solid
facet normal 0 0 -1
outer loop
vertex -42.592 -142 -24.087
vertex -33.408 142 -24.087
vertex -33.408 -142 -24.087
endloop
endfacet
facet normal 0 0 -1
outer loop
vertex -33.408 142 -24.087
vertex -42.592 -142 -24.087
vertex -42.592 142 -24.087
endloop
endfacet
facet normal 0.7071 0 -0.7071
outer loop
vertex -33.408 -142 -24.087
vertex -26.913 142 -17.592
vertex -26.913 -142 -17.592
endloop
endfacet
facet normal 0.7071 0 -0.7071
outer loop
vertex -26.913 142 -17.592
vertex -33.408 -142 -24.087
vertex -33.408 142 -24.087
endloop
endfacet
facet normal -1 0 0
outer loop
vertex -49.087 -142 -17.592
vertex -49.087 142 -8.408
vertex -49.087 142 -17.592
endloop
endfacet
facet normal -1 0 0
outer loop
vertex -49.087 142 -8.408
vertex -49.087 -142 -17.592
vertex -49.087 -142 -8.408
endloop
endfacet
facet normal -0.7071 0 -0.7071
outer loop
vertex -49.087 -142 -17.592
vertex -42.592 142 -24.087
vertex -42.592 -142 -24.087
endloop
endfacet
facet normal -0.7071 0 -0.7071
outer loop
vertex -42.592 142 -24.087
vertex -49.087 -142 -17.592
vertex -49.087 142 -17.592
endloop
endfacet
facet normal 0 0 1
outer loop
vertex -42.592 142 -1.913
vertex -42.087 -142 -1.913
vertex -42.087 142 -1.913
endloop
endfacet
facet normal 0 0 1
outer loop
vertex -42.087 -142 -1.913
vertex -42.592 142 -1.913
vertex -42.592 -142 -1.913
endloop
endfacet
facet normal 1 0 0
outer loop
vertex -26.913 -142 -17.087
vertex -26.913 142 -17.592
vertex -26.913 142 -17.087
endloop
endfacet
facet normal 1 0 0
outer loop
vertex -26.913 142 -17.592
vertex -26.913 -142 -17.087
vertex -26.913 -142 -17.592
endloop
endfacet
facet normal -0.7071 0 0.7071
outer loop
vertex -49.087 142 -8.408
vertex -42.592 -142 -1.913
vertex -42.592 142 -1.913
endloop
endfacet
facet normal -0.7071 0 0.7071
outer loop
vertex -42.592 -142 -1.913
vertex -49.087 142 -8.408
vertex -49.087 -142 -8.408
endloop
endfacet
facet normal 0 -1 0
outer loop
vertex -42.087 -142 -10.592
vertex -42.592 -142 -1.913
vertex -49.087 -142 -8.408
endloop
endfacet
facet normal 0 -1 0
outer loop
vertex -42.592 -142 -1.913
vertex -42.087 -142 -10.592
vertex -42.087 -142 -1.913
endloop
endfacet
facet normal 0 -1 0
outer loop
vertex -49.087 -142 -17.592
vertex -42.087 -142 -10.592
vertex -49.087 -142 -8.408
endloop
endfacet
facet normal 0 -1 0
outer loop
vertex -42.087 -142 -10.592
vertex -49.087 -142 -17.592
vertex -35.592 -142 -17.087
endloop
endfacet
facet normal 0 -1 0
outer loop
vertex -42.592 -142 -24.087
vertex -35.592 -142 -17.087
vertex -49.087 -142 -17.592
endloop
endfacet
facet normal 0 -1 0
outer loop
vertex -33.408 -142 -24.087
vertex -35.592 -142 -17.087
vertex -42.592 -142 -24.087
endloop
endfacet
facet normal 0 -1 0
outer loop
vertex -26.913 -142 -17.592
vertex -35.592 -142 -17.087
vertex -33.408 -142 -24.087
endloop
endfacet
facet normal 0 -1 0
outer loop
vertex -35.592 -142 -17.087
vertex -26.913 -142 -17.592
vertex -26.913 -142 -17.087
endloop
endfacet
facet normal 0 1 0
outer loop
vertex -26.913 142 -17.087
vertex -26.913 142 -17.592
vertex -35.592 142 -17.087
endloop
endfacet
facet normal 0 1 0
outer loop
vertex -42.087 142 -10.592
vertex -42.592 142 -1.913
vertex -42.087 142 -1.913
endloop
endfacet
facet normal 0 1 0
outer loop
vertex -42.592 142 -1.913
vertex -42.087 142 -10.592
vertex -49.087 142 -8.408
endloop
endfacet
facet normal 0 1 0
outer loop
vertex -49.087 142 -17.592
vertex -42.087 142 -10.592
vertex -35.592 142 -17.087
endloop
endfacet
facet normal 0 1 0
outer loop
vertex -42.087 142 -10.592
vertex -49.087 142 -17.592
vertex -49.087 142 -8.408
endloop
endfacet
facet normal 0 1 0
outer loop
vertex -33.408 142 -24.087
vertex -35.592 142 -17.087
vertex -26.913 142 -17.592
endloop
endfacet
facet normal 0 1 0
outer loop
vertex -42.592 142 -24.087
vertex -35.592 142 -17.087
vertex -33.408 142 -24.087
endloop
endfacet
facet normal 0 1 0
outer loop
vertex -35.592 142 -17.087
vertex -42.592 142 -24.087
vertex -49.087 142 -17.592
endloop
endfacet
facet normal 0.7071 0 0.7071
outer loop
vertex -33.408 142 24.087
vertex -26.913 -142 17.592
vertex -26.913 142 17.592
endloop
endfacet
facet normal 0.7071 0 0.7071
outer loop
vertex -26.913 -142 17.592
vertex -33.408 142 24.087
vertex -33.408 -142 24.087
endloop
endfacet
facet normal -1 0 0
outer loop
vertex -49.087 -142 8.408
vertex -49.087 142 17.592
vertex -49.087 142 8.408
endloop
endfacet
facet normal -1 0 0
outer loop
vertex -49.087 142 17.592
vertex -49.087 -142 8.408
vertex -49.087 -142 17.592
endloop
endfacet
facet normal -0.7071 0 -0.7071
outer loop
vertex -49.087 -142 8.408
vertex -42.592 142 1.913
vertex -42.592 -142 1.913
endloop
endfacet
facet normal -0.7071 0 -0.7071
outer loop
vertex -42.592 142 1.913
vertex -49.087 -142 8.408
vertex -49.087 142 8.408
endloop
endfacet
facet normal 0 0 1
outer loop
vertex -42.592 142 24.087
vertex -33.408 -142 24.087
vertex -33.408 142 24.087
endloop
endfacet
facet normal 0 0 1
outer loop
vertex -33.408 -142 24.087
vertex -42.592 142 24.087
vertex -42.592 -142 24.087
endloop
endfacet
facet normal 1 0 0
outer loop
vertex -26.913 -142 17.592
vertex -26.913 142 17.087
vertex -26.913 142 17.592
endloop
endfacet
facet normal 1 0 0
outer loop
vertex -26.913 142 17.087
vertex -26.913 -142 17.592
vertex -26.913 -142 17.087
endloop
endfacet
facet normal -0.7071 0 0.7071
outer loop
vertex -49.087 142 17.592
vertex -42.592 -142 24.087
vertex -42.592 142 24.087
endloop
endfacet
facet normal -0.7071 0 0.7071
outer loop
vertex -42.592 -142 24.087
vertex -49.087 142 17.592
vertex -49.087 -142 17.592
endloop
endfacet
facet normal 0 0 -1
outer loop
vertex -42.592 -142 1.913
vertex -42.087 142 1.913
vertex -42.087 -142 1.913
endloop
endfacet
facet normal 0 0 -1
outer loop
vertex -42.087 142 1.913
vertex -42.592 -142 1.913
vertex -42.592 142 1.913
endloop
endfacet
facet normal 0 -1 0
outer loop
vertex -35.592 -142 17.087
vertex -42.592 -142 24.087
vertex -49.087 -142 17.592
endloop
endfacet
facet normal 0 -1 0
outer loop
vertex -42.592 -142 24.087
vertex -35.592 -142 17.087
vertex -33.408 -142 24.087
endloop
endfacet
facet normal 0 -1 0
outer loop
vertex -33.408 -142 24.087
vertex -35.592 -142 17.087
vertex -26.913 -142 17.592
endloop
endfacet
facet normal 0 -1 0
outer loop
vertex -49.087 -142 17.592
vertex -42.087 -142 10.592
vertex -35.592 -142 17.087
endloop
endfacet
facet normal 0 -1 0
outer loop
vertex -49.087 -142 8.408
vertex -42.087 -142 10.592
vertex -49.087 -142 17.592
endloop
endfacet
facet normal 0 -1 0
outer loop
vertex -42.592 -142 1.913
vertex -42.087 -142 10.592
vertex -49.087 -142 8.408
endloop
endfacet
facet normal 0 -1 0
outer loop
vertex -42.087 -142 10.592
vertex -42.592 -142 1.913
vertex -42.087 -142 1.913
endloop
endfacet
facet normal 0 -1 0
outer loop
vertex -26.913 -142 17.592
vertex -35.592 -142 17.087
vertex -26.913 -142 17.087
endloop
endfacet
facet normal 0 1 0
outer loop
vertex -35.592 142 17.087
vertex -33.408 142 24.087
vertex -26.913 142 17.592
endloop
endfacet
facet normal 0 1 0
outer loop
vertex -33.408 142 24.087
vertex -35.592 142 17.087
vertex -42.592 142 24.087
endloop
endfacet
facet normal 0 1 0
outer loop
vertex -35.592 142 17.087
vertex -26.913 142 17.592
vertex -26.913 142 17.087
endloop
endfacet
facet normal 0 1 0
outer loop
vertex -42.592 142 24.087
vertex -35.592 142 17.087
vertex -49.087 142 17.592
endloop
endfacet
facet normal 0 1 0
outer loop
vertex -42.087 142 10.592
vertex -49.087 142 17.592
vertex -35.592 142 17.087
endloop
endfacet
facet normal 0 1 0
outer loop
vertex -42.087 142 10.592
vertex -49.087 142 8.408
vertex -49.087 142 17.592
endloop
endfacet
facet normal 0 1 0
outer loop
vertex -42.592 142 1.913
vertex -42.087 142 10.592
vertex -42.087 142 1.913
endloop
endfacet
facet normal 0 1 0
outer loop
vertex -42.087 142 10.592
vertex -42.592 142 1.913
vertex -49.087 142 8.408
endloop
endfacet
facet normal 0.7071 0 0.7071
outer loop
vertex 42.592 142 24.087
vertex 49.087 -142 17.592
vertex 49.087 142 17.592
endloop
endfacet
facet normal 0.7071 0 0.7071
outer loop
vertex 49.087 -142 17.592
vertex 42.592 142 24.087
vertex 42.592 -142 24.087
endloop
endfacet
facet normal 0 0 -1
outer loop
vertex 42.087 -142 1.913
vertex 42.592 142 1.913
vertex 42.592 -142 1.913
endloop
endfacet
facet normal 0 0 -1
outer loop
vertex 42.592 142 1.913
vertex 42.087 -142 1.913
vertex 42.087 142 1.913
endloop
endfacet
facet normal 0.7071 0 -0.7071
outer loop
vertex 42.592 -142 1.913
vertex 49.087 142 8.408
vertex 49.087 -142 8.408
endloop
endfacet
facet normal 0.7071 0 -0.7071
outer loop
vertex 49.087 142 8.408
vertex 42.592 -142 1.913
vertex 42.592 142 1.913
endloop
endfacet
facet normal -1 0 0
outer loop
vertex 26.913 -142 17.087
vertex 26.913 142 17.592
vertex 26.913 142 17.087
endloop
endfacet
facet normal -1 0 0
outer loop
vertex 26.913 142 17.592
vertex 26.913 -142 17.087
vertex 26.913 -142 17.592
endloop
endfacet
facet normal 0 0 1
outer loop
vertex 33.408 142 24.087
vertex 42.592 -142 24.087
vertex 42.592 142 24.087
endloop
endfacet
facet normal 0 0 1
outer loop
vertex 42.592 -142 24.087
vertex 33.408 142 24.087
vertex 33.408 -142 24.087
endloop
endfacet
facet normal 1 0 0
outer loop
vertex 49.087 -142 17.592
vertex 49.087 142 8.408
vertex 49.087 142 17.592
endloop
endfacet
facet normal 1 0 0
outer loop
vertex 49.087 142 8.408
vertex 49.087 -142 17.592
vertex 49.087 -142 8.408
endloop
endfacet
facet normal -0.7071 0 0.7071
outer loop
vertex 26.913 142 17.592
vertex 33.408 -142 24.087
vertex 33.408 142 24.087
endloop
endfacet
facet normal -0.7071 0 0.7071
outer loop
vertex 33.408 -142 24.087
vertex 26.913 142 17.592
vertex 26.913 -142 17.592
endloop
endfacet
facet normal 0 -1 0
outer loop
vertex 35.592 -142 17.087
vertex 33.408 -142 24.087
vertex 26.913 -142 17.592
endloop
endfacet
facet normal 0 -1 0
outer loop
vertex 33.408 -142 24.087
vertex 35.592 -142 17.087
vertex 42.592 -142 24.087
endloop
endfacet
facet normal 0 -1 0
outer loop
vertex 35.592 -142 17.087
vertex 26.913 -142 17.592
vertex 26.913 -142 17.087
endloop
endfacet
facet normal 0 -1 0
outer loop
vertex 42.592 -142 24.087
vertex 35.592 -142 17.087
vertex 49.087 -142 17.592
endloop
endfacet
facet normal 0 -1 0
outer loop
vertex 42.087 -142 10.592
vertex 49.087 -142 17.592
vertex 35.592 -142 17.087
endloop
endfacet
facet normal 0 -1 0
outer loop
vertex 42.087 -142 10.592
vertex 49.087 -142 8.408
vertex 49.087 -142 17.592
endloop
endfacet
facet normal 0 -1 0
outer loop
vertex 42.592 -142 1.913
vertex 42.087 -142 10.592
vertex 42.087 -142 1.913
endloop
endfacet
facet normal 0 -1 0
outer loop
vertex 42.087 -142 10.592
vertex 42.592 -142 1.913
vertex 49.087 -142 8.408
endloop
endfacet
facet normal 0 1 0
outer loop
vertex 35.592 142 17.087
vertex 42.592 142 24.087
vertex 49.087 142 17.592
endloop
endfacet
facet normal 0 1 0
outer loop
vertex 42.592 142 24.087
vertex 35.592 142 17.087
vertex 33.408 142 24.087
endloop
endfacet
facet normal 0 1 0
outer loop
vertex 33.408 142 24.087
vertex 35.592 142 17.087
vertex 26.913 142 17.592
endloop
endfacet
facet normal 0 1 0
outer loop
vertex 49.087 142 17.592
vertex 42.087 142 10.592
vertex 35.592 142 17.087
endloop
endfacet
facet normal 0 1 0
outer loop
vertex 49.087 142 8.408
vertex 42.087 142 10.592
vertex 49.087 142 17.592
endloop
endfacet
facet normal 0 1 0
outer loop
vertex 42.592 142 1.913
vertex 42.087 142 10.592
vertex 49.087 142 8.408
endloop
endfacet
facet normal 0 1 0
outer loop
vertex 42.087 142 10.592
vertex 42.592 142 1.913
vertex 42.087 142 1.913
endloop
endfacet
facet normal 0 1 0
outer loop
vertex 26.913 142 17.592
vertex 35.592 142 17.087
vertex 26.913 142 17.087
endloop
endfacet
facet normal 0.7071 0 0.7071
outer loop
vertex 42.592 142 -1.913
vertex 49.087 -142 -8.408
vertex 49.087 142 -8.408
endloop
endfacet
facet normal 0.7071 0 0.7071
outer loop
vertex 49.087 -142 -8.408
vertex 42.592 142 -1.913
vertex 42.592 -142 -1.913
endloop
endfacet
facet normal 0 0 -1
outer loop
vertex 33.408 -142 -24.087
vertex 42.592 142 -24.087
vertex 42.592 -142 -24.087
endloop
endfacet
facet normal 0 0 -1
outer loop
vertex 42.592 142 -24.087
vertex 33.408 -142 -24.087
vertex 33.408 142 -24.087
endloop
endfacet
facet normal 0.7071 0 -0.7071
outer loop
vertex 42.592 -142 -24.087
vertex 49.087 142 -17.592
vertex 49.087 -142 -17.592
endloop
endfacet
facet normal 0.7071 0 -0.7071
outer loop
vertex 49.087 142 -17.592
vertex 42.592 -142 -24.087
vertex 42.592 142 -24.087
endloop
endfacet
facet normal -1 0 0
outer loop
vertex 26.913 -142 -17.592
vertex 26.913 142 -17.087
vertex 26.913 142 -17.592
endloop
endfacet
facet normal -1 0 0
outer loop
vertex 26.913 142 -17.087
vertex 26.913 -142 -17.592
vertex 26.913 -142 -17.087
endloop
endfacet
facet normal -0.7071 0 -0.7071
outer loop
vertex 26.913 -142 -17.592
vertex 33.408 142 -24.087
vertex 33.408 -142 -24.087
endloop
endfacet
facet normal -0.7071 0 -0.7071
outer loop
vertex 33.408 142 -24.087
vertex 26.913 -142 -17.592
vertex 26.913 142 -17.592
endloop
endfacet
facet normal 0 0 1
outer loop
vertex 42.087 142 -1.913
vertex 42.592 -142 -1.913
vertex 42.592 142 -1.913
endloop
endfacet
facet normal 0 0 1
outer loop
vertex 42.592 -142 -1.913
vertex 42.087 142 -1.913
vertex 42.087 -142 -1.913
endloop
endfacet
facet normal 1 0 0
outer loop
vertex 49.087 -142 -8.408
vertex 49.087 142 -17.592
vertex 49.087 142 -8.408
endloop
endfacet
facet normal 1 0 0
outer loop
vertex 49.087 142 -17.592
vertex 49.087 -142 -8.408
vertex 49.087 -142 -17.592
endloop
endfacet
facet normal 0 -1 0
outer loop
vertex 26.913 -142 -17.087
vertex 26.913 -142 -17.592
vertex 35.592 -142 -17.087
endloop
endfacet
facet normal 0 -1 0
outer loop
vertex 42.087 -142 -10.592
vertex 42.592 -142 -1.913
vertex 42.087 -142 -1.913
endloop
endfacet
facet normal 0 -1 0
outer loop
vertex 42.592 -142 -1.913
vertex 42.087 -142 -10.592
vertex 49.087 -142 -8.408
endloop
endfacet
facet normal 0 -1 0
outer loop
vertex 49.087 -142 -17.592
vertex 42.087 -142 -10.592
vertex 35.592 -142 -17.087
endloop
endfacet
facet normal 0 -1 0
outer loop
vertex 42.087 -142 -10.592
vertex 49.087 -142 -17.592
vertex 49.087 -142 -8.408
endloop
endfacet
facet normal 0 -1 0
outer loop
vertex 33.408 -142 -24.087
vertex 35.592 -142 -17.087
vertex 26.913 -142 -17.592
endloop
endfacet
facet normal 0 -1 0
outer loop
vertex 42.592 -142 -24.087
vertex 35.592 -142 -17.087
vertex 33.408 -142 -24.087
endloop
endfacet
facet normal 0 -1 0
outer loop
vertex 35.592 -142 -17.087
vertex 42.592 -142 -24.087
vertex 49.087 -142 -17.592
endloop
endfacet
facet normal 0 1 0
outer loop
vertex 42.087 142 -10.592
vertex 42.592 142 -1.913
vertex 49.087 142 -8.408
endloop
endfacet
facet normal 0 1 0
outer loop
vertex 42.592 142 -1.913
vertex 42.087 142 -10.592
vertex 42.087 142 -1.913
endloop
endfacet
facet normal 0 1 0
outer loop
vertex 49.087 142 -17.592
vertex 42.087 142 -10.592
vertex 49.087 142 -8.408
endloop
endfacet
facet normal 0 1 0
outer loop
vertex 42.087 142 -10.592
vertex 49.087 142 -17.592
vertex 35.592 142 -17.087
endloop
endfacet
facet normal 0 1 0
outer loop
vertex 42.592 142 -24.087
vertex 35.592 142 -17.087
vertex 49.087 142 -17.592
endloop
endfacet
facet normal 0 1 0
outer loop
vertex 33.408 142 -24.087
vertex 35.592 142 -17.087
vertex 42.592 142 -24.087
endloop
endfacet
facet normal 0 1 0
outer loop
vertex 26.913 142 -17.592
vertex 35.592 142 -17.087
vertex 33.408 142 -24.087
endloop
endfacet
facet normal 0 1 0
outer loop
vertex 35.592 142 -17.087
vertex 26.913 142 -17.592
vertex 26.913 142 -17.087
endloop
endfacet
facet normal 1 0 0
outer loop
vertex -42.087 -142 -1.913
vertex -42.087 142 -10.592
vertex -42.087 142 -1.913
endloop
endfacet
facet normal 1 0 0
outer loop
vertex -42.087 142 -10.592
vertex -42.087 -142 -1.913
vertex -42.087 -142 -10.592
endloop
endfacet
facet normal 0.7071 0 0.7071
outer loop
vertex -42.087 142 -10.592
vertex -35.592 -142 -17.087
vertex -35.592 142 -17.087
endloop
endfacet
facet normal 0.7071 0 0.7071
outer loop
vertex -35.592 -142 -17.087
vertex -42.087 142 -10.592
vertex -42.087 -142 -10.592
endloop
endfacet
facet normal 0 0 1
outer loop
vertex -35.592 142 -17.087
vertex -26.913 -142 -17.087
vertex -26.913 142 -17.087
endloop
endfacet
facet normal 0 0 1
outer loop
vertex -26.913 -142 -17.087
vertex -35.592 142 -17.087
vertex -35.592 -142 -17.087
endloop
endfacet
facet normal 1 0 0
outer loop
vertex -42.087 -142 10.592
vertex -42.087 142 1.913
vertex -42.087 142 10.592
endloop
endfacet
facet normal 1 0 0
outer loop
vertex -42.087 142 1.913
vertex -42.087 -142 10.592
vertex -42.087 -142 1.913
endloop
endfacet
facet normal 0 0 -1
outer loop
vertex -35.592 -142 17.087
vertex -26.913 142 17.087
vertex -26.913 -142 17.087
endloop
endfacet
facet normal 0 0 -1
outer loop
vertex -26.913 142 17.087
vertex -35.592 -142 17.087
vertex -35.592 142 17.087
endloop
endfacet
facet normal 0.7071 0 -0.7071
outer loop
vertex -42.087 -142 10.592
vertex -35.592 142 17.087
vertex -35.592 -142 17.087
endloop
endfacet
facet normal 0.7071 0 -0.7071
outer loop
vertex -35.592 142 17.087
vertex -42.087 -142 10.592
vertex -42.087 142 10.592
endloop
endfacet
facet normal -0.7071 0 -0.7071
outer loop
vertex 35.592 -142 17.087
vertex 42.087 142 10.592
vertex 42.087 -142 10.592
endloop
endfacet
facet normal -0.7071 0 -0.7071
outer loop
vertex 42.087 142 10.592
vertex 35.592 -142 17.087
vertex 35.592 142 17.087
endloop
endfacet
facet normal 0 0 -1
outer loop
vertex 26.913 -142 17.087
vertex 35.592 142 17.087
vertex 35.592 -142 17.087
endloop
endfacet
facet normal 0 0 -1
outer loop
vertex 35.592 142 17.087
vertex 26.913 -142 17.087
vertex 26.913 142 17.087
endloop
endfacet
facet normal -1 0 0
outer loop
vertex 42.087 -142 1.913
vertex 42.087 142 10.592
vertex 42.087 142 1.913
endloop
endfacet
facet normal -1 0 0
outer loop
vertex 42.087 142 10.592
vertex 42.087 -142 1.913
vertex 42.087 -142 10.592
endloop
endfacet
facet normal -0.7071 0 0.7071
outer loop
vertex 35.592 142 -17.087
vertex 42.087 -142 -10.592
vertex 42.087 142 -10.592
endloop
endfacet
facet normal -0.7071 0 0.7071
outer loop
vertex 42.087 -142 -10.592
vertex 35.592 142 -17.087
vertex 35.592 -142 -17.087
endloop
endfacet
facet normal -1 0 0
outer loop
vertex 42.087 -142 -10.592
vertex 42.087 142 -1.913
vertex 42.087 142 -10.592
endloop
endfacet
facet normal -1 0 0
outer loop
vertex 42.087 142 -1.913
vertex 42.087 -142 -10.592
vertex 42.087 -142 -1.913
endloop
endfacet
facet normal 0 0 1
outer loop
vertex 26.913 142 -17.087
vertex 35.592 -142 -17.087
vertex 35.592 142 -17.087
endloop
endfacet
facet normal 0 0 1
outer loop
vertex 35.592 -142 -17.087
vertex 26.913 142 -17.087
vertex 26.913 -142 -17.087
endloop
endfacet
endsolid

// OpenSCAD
//---------------------------------------------------------------
//-- Openscad Corner reinforcements used in Cool PCB Enclosure (http://www.thingiverse.com/thing:1665075).
//-- Version: 1.0
//-- Jul-2016
//---------------------------------------------------------------
//-- Released under the GPL3 license
//---------------------------------------------------------------

Box_Length = 300;
Box_Width = 100;
Box_Height = 50;
Fillet = 12;
honeycomb_height= 5;
rail_thickness = 3;
Shield_thickness = 2;
  external_XPos = Box_Width - 2*Fillet;
  external_YPos = Box_Height - 2*Fillet;
  external_Pos = square_vertices(external_XPos, external_YPos);

  internal_XPos = Box_Width - 2*Fillet - 2*honeycomb_height - 2*Shield_thickness;
  internal_YPos = Box_Height - 2*Fillet - 2*honeycomb_height - 2*Shield_thickness;
  internal_Pos = square_vertices(internal_XPos, internal_YPos);
  
function square_vertices(x, y) = [[ -x/2, -y/2, 0], [ -x/2, y/2, 0], [x/2, y/2, 0], [x/2, -y/2, 0]];

  difference(){  
     
    for (i = [0 : 3] ){
      translate([external_Pos[i][0], 0, external_Pos[i][1]]) 
        rotate([90, 360/16, 0])
          cylinder(r = Fillet, h = Box_Length - 4*rail_thickness - 2*Shield_thickness, center = true, $fn = 8);
    } //fo
     
    for (i = [0 : 3] ){
      translate([internal_Pos[i][0], 0, internal_Pos[i][1]]) 
        rotate([90, 360/16, 0])
          cylinder(r = Fillet, h = Box_Length + 1, center = true, $fn = 8);
    } //fo
  } //di
  
